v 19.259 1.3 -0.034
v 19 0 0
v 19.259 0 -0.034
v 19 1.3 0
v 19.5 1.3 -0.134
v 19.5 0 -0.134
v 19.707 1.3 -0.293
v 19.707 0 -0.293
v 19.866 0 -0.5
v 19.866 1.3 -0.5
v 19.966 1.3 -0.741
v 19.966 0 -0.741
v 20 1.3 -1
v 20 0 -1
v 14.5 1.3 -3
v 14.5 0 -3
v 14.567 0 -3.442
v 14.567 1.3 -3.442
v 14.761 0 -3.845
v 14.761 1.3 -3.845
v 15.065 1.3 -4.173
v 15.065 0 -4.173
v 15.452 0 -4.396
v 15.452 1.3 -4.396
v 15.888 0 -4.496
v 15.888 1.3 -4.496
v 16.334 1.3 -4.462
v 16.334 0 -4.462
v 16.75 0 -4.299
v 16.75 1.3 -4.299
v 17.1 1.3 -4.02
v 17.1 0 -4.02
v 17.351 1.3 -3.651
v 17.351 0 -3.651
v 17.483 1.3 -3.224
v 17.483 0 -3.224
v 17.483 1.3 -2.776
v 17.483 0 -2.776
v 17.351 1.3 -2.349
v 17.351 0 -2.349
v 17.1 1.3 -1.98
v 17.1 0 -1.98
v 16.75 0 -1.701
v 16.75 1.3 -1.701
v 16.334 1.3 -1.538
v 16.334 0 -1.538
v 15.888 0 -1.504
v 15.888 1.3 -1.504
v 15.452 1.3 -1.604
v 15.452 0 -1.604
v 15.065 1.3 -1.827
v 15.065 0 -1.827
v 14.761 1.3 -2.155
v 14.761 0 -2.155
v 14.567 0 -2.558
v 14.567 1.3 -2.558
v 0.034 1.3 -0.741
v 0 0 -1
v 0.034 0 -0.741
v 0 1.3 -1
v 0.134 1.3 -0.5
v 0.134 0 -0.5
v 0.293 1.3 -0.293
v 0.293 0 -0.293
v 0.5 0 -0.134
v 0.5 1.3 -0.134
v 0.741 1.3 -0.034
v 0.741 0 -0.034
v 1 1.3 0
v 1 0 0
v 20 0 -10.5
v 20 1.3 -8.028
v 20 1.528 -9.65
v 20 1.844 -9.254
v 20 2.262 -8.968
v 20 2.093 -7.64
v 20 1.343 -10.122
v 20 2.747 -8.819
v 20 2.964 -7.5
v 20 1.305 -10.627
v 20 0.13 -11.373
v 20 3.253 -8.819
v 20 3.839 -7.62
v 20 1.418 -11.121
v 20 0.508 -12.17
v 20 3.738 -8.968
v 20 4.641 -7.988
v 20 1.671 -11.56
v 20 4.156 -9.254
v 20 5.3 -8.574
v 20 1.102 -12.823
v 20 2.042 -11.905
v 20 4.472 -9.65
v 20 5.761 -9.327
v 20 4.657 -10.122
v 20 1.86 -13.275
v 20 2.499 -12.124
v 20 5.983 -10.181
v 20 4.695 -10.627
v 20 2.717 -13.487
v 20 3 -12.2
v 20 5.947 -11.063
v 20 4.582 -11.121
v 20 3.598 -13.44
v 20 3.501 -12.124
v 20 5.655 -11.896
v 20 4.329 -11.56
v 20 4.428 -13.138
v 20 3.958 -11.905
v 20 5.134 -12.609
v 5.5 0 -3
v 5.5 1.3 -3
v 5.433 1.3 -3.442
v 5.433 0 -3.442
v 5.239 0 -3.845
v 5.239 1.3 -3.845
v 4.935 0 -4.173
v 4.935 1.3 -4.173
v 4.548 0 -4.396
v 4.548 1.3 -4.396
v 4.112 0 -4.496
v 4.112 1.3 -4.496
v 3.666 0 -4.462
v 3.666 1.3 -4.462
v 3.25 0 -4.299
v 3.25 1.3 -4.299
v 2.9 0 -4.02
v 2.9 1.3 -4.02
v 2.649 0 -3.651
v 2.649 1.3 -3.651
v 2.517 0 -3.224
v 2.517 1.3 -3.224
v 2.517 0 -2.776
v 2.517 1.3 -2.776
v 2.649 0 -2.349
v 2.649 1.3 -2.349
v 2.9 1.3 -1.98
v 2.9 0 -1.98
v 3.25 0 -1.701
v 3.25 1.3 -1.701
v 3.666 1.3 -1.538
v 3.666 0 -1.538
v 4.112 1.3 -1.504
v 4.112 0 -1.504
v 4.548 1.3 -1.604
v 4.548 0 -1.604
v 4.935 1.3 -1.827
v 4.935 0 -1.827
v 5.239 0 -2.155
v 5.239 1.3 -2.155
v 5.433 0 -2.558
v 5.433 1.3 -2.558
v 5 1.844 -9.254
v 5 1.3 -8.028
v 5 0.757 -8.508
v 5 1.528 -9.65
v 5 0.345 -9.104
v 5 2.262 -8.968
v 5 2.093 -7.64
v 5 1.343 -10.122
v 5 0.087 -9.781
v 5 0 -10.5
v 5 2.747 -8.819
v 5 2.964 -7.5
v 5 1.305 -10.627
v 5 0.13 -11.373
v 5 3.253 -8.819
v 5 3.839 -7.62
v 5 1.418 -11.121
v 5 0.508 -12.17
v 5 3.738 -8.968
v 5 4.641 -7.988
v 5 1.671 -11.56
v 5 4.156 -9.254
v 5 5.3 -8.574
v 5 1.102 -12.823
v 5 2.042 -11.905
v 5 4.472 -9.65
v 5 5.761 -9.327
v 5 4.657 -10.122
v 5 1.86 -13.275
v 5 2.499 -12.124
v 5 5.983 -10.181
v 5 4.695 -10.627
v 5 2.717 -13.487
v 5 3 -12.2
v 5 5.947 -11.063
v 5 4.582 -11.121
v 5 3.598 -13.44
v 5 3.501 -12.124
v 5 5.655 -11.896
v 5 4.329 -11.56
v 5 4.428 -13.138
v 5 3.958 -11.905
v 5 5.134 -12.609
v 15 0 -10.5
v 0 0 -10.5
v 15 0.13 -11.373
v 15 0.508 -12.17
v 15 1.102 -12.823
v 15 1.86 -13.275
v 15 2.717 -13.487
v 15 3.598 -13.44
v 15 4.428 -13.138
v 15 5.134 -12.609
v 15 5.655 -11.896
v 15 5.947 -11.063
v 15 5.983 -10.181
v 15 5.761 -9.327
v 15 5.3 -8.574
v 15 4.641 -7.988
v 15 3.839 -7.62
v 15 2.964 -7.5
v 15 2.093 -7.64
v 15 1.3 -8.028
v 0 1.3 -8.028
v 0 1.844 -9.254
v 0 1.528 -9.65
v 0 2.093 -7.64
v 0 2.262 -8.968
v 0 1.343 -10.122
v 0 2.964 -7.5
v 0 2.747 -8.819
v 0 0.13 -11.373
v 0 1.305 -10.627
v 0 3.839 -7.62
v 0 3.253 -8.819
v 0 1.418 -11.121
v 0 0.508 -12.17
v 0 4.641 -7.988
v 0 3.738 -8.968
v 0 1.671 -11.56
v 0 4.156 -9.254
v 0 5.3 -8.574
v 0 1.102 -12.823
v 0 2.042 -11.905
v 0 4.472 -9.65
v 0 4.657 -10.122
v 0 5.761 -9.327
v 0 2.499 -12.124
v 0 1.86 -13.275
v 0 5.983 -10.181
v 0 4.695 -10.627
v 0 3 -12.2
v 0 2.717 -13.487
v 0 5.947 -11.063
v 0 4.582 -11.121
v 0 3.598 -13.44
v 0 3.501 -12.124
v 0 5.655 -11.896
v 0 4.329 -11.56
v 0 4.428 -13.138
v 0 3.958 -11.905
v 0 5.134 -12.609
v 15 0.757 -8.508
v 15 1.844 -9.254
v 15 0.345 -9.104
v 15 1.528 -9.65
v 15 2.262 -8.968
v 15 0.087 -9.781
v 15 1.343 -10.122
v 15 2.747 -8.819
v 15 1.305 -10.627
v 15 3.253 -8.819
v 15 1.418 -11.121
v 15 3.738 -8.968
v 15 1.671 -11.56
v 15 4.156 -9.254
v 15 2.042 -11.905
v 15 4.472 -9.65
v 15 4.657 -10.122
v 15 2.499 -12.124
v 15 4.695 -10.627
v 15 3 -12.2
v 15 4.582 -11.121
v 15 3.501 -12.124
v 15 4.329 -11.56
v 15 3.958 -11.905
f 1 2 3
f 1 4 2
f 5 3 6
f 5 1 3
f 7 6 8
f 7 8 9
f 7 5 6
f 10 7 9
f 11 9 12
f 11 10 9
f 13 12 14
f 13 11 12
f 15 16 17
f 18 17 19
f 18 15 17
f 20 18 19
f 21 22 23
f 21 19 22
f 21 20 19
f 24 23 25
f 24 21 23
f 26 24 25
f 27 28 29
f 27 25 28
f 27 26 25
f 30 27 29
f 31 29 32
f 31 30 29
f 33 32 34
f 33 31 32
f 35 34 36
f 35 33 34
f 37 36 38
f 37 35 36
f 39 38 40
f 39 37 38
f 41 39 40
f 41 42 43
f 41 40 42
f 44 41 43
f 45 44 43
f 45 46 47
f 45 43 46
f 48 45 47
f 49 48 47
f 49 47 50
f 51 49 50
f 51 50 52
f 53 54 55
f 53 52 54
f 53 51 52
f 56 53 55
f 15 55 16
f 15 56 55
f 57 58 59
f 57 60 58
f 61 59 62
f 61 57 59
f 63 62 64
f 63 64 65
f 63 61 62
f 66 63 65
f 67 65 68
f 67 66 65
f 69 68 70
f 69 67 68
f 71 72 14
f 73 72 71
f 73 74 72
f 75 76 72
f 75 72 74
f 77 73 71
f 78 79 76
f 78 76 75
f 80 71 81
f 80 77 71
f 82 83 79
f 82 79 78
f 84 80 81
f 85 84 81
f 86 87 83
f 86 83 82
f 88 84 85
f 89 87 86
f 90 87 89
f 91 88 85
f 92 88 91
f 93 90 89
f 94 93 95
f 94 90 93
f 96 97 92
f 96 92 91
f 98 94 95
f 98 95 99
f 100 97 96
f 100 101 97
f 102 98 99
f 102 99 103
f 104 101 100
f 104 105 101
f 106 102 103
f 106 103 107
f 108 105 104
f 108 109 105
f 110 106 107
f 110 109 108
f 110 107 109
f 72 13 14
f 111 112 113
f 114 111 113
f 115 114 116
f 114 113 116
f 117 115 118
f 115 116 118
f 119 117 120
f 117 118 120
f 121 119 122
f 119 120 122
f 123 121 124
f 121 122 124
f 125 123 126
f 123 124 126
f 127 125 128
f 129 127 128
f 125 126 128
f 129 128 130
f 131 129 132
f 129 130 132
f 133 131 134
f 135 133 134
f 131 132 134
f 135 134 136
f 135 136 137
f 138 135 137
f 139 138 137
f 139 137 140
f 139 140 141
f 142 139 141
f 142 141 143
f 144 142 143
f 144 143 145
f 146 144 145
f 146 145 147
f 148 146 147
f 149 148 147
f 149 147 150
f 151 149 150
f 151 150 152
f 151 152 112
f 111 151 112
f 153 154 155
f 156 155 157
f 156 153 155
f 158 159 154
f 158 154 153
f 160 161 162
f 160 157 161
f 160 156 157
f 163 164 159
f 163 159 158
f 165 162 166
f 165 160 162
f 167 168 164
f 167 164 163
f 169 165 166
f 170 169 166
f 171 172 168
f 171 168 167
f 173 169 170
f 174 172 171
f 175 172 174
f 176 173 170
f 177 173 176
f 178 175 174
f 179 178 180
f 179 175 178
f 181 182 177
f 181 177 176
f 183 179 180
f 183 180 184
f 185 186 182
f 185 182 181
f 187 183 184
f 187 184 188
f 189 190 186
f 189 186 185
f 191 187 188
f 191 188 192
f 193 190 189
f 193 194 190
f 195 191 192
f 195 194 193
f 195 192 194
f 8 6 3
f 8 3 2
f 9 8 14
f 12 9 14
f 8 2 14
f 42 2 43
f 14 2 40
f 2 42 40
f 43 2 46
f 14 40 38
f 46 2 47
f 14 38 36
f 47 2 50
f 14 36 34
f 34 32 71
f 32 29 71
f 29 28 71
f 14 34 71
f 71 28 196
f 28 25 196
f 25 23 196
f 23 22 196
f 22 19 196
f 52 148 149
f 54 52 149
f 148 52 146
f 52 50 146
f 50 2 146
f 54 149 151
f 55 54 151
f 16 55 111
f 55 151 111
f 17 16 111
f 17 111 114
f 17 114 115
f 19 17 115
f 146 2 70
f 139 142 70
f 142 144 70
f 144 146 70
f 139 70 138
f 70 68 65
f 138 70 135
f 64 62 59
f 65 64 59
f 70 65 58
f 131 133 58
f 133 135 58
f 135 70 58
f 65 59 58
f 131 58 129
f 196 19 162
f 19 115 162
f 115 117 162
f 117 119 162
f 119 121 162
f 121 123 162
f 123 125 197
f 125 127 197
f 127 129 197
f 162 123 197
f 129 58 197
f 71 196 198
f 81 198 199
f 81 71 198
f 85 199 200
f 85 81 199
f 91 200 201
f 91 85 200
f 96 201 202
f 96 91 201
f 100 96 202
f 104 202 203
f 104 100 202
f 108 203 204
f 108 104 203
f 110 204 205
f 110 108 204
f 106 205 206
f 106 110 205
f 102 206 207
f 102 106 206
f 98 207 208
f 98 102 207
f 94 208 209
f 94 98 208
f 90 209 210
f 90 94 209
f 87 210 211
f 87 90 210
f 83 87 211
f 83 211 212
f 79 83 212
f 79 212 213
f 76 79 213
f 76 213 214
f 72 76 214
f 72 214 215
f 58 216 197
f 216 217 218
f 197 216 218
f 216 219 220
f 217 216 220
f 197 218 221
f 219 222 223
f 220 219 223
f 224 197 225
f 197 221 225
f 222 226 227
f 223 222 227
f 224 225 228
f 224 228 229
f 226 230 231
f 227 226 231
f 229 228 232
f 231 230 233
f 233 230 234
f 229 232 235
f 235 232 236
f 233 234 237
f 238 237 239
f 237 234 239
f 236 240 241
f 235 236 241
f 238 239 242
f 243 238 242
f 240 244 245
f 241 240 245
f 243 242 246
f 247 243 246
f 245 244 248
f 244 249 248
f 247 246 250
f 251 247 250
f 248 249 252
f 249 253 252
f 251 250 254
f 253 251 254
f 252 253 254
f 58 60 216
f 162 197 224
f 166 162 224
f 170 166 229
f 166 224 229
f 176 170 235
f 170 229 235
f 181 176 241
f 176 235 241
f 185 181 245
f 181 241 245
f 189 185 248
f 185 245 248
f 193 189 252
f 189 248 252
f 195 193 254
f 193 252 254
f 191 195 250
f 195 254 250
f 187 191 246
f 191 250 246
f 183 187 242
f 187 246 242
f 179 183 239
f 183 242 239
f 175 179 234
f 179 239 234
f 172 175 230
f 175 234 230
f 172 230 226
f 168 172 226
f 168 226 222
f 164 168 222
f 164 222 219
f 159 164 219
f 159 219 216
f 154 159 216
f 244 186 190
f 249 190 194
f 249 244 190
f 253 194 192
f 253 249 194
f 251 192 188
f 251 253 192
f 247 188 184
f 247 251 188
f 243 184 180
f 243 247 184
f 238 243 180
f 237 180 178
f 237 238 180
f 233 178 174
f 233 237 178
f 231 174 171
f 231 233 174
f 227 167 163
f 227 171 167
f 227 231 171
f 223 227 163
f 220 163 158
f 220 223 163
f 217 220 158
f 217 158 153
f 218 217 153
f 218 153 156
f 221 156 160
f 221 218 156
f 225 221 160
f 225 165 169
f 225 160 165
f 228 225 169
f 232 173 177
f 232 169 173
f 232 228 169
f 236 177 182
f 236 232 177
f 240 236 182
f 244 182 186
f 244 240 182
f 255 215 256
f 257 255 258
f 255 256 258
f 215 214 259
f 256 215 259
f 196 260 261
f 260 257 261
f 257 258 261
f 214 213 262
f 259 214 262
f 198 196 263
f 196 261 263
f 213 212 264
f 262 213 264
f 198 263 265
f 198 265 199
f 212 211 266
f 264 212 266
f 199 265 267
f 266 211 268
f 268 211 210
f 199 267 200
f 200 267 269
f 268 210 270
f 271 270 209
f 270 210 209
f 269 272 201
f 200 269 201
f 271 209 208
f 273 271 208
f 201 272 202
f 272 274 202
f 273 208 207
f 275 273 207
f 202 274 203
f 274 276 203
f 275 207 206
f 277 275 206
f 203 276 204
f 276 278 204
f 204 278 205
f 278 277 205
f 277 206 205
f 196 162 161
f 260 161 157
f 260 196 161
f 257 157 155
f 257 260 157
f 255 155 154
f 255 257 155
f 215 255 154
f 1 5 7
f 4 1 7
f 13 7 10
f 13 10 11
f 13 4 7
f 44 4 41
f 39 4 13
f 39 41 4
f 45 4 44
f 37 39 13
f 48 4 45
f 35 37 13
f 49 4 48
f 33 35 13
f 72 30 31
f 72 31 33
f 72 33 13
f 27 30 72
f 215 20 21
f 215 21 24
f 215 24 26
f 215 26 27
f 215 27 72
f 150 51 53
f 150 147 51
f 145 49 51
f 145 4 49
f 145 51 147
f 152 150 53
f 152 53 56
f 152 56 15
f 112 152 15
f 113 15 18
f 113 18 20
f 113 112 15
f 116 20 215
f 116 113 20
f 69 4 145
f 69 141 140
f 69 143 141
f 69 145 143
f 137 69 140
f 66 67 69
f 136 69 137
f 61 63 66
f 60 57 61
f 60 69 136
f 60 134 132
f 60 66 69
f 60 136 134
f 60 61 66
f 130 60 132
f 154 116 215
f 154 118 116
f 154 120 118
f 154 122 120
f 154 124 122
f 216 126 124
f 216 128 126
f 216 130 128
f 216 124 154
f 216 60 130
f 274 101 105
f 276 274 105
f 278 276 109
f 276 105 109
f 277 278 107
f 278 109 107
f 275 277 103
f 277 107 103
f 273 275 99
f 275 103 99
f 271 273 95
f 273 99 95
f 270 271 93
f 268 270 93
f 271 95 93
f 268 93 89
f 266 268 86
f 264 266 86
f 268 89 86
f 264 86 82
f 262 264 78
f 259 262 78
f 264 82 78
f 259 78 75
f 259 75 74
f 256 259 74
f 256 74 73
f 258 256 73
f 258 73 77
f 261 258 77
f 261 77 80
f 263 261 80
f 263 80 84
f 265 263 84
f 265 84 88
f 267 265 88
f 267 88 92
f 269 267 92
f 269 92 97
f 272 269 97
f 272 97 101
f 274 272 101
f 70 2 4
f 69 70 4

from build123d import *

# Parameters (mm, degrees)
SKETCH_1_W          = 10.5
SKETCH_1_H          = 1.3
EXTRUDE_2_DEPTH     = 20
SKETCH_2_R          = 3
SKETCH_2_R_2        = 1.7
EXTRUDE_3_DEPTH     = 5
SKETCH_3_R          = 3
CUT_EXTRUDE_1_DEPTH = 10
SKETCH_4_R          = 1.5
CUT_EXTRUDE_2_DEPTH = 10
FILLET_1_R          = 1


with BuildPart() as part:
    # 草图1 → 凸台-拉伸2 (new body)
    with BuildSketch(Plane(origin=(0, 0, 0), x_dir=(0, 0, -1), z_dir=(1, 0, 0))):
        with Locations((5.25, 0.65)):
            Rectangle(SKETCH_1_W, SKETCH_1_H)
    extrude(amount=EXTRUDE_2_DEPTH)

    # 草图2 → 凸台-拉伸3 (add)
    with BuildSketch(Plane(origin=(20, 0, 0), x_dir=(0, 0, -1), z_dir=(1, 0, 0))):
        with Locations((10.5, 3)):
            Circle(SKETCH_2_R)
        with Locations((10.5, 3)):
            Circle(SKETCH_2_R_2, mode=Mode.SUBTRACT)
    extrude_3 = extrude(amount=-EXTRUDE_3_DEPTH)

    # 草图3 → 切除-拉伸1 (cut)
    with BuildSketch(Plane.ZY.offset(-15)):
        with Locations((-10.5, 3)):
            Circle(SKETCH_3_R)
    extrude(amount=CUT_EXTRUDE_1_DEPTH, mode=Mode.SUBTRACT)

    # 镜向1: 凸台-拉伸3 across plane
    add(extrude_3.mirror(Plane.ZY.offset(-10)))

    # 草图4 → 切除-拉伸2 (cut)
    with BuildSketch(Plane(origin=(0, 1.3, 0), x_dir=(1, 0, 0), z_dir=(0, 1, 0))):
        with Locations((4, 3)):
            Circle(SKETCH_4_R)
    cut_extrude_2 = extrude(amount=-CUT_EXTRUDE_2_DEPTH, mode=Mode.SUBTRACT)

    # 镜向2: 切除-拉伸2 across plane
    add(cut_extrude_2.mirror(Plane.ZY.offset(-10)), mode=Mode.SUBTRACT)

    # 圆角1
    fillet_1_edges = [part.edges().sort_by_distance(p)[0] for p in [
        (20, 0.65, 0),
        (0, 0.65, 0),
    ]]
    fillet(fillet_1_edges, radius=FILLET_1_R)


solid = part.part
